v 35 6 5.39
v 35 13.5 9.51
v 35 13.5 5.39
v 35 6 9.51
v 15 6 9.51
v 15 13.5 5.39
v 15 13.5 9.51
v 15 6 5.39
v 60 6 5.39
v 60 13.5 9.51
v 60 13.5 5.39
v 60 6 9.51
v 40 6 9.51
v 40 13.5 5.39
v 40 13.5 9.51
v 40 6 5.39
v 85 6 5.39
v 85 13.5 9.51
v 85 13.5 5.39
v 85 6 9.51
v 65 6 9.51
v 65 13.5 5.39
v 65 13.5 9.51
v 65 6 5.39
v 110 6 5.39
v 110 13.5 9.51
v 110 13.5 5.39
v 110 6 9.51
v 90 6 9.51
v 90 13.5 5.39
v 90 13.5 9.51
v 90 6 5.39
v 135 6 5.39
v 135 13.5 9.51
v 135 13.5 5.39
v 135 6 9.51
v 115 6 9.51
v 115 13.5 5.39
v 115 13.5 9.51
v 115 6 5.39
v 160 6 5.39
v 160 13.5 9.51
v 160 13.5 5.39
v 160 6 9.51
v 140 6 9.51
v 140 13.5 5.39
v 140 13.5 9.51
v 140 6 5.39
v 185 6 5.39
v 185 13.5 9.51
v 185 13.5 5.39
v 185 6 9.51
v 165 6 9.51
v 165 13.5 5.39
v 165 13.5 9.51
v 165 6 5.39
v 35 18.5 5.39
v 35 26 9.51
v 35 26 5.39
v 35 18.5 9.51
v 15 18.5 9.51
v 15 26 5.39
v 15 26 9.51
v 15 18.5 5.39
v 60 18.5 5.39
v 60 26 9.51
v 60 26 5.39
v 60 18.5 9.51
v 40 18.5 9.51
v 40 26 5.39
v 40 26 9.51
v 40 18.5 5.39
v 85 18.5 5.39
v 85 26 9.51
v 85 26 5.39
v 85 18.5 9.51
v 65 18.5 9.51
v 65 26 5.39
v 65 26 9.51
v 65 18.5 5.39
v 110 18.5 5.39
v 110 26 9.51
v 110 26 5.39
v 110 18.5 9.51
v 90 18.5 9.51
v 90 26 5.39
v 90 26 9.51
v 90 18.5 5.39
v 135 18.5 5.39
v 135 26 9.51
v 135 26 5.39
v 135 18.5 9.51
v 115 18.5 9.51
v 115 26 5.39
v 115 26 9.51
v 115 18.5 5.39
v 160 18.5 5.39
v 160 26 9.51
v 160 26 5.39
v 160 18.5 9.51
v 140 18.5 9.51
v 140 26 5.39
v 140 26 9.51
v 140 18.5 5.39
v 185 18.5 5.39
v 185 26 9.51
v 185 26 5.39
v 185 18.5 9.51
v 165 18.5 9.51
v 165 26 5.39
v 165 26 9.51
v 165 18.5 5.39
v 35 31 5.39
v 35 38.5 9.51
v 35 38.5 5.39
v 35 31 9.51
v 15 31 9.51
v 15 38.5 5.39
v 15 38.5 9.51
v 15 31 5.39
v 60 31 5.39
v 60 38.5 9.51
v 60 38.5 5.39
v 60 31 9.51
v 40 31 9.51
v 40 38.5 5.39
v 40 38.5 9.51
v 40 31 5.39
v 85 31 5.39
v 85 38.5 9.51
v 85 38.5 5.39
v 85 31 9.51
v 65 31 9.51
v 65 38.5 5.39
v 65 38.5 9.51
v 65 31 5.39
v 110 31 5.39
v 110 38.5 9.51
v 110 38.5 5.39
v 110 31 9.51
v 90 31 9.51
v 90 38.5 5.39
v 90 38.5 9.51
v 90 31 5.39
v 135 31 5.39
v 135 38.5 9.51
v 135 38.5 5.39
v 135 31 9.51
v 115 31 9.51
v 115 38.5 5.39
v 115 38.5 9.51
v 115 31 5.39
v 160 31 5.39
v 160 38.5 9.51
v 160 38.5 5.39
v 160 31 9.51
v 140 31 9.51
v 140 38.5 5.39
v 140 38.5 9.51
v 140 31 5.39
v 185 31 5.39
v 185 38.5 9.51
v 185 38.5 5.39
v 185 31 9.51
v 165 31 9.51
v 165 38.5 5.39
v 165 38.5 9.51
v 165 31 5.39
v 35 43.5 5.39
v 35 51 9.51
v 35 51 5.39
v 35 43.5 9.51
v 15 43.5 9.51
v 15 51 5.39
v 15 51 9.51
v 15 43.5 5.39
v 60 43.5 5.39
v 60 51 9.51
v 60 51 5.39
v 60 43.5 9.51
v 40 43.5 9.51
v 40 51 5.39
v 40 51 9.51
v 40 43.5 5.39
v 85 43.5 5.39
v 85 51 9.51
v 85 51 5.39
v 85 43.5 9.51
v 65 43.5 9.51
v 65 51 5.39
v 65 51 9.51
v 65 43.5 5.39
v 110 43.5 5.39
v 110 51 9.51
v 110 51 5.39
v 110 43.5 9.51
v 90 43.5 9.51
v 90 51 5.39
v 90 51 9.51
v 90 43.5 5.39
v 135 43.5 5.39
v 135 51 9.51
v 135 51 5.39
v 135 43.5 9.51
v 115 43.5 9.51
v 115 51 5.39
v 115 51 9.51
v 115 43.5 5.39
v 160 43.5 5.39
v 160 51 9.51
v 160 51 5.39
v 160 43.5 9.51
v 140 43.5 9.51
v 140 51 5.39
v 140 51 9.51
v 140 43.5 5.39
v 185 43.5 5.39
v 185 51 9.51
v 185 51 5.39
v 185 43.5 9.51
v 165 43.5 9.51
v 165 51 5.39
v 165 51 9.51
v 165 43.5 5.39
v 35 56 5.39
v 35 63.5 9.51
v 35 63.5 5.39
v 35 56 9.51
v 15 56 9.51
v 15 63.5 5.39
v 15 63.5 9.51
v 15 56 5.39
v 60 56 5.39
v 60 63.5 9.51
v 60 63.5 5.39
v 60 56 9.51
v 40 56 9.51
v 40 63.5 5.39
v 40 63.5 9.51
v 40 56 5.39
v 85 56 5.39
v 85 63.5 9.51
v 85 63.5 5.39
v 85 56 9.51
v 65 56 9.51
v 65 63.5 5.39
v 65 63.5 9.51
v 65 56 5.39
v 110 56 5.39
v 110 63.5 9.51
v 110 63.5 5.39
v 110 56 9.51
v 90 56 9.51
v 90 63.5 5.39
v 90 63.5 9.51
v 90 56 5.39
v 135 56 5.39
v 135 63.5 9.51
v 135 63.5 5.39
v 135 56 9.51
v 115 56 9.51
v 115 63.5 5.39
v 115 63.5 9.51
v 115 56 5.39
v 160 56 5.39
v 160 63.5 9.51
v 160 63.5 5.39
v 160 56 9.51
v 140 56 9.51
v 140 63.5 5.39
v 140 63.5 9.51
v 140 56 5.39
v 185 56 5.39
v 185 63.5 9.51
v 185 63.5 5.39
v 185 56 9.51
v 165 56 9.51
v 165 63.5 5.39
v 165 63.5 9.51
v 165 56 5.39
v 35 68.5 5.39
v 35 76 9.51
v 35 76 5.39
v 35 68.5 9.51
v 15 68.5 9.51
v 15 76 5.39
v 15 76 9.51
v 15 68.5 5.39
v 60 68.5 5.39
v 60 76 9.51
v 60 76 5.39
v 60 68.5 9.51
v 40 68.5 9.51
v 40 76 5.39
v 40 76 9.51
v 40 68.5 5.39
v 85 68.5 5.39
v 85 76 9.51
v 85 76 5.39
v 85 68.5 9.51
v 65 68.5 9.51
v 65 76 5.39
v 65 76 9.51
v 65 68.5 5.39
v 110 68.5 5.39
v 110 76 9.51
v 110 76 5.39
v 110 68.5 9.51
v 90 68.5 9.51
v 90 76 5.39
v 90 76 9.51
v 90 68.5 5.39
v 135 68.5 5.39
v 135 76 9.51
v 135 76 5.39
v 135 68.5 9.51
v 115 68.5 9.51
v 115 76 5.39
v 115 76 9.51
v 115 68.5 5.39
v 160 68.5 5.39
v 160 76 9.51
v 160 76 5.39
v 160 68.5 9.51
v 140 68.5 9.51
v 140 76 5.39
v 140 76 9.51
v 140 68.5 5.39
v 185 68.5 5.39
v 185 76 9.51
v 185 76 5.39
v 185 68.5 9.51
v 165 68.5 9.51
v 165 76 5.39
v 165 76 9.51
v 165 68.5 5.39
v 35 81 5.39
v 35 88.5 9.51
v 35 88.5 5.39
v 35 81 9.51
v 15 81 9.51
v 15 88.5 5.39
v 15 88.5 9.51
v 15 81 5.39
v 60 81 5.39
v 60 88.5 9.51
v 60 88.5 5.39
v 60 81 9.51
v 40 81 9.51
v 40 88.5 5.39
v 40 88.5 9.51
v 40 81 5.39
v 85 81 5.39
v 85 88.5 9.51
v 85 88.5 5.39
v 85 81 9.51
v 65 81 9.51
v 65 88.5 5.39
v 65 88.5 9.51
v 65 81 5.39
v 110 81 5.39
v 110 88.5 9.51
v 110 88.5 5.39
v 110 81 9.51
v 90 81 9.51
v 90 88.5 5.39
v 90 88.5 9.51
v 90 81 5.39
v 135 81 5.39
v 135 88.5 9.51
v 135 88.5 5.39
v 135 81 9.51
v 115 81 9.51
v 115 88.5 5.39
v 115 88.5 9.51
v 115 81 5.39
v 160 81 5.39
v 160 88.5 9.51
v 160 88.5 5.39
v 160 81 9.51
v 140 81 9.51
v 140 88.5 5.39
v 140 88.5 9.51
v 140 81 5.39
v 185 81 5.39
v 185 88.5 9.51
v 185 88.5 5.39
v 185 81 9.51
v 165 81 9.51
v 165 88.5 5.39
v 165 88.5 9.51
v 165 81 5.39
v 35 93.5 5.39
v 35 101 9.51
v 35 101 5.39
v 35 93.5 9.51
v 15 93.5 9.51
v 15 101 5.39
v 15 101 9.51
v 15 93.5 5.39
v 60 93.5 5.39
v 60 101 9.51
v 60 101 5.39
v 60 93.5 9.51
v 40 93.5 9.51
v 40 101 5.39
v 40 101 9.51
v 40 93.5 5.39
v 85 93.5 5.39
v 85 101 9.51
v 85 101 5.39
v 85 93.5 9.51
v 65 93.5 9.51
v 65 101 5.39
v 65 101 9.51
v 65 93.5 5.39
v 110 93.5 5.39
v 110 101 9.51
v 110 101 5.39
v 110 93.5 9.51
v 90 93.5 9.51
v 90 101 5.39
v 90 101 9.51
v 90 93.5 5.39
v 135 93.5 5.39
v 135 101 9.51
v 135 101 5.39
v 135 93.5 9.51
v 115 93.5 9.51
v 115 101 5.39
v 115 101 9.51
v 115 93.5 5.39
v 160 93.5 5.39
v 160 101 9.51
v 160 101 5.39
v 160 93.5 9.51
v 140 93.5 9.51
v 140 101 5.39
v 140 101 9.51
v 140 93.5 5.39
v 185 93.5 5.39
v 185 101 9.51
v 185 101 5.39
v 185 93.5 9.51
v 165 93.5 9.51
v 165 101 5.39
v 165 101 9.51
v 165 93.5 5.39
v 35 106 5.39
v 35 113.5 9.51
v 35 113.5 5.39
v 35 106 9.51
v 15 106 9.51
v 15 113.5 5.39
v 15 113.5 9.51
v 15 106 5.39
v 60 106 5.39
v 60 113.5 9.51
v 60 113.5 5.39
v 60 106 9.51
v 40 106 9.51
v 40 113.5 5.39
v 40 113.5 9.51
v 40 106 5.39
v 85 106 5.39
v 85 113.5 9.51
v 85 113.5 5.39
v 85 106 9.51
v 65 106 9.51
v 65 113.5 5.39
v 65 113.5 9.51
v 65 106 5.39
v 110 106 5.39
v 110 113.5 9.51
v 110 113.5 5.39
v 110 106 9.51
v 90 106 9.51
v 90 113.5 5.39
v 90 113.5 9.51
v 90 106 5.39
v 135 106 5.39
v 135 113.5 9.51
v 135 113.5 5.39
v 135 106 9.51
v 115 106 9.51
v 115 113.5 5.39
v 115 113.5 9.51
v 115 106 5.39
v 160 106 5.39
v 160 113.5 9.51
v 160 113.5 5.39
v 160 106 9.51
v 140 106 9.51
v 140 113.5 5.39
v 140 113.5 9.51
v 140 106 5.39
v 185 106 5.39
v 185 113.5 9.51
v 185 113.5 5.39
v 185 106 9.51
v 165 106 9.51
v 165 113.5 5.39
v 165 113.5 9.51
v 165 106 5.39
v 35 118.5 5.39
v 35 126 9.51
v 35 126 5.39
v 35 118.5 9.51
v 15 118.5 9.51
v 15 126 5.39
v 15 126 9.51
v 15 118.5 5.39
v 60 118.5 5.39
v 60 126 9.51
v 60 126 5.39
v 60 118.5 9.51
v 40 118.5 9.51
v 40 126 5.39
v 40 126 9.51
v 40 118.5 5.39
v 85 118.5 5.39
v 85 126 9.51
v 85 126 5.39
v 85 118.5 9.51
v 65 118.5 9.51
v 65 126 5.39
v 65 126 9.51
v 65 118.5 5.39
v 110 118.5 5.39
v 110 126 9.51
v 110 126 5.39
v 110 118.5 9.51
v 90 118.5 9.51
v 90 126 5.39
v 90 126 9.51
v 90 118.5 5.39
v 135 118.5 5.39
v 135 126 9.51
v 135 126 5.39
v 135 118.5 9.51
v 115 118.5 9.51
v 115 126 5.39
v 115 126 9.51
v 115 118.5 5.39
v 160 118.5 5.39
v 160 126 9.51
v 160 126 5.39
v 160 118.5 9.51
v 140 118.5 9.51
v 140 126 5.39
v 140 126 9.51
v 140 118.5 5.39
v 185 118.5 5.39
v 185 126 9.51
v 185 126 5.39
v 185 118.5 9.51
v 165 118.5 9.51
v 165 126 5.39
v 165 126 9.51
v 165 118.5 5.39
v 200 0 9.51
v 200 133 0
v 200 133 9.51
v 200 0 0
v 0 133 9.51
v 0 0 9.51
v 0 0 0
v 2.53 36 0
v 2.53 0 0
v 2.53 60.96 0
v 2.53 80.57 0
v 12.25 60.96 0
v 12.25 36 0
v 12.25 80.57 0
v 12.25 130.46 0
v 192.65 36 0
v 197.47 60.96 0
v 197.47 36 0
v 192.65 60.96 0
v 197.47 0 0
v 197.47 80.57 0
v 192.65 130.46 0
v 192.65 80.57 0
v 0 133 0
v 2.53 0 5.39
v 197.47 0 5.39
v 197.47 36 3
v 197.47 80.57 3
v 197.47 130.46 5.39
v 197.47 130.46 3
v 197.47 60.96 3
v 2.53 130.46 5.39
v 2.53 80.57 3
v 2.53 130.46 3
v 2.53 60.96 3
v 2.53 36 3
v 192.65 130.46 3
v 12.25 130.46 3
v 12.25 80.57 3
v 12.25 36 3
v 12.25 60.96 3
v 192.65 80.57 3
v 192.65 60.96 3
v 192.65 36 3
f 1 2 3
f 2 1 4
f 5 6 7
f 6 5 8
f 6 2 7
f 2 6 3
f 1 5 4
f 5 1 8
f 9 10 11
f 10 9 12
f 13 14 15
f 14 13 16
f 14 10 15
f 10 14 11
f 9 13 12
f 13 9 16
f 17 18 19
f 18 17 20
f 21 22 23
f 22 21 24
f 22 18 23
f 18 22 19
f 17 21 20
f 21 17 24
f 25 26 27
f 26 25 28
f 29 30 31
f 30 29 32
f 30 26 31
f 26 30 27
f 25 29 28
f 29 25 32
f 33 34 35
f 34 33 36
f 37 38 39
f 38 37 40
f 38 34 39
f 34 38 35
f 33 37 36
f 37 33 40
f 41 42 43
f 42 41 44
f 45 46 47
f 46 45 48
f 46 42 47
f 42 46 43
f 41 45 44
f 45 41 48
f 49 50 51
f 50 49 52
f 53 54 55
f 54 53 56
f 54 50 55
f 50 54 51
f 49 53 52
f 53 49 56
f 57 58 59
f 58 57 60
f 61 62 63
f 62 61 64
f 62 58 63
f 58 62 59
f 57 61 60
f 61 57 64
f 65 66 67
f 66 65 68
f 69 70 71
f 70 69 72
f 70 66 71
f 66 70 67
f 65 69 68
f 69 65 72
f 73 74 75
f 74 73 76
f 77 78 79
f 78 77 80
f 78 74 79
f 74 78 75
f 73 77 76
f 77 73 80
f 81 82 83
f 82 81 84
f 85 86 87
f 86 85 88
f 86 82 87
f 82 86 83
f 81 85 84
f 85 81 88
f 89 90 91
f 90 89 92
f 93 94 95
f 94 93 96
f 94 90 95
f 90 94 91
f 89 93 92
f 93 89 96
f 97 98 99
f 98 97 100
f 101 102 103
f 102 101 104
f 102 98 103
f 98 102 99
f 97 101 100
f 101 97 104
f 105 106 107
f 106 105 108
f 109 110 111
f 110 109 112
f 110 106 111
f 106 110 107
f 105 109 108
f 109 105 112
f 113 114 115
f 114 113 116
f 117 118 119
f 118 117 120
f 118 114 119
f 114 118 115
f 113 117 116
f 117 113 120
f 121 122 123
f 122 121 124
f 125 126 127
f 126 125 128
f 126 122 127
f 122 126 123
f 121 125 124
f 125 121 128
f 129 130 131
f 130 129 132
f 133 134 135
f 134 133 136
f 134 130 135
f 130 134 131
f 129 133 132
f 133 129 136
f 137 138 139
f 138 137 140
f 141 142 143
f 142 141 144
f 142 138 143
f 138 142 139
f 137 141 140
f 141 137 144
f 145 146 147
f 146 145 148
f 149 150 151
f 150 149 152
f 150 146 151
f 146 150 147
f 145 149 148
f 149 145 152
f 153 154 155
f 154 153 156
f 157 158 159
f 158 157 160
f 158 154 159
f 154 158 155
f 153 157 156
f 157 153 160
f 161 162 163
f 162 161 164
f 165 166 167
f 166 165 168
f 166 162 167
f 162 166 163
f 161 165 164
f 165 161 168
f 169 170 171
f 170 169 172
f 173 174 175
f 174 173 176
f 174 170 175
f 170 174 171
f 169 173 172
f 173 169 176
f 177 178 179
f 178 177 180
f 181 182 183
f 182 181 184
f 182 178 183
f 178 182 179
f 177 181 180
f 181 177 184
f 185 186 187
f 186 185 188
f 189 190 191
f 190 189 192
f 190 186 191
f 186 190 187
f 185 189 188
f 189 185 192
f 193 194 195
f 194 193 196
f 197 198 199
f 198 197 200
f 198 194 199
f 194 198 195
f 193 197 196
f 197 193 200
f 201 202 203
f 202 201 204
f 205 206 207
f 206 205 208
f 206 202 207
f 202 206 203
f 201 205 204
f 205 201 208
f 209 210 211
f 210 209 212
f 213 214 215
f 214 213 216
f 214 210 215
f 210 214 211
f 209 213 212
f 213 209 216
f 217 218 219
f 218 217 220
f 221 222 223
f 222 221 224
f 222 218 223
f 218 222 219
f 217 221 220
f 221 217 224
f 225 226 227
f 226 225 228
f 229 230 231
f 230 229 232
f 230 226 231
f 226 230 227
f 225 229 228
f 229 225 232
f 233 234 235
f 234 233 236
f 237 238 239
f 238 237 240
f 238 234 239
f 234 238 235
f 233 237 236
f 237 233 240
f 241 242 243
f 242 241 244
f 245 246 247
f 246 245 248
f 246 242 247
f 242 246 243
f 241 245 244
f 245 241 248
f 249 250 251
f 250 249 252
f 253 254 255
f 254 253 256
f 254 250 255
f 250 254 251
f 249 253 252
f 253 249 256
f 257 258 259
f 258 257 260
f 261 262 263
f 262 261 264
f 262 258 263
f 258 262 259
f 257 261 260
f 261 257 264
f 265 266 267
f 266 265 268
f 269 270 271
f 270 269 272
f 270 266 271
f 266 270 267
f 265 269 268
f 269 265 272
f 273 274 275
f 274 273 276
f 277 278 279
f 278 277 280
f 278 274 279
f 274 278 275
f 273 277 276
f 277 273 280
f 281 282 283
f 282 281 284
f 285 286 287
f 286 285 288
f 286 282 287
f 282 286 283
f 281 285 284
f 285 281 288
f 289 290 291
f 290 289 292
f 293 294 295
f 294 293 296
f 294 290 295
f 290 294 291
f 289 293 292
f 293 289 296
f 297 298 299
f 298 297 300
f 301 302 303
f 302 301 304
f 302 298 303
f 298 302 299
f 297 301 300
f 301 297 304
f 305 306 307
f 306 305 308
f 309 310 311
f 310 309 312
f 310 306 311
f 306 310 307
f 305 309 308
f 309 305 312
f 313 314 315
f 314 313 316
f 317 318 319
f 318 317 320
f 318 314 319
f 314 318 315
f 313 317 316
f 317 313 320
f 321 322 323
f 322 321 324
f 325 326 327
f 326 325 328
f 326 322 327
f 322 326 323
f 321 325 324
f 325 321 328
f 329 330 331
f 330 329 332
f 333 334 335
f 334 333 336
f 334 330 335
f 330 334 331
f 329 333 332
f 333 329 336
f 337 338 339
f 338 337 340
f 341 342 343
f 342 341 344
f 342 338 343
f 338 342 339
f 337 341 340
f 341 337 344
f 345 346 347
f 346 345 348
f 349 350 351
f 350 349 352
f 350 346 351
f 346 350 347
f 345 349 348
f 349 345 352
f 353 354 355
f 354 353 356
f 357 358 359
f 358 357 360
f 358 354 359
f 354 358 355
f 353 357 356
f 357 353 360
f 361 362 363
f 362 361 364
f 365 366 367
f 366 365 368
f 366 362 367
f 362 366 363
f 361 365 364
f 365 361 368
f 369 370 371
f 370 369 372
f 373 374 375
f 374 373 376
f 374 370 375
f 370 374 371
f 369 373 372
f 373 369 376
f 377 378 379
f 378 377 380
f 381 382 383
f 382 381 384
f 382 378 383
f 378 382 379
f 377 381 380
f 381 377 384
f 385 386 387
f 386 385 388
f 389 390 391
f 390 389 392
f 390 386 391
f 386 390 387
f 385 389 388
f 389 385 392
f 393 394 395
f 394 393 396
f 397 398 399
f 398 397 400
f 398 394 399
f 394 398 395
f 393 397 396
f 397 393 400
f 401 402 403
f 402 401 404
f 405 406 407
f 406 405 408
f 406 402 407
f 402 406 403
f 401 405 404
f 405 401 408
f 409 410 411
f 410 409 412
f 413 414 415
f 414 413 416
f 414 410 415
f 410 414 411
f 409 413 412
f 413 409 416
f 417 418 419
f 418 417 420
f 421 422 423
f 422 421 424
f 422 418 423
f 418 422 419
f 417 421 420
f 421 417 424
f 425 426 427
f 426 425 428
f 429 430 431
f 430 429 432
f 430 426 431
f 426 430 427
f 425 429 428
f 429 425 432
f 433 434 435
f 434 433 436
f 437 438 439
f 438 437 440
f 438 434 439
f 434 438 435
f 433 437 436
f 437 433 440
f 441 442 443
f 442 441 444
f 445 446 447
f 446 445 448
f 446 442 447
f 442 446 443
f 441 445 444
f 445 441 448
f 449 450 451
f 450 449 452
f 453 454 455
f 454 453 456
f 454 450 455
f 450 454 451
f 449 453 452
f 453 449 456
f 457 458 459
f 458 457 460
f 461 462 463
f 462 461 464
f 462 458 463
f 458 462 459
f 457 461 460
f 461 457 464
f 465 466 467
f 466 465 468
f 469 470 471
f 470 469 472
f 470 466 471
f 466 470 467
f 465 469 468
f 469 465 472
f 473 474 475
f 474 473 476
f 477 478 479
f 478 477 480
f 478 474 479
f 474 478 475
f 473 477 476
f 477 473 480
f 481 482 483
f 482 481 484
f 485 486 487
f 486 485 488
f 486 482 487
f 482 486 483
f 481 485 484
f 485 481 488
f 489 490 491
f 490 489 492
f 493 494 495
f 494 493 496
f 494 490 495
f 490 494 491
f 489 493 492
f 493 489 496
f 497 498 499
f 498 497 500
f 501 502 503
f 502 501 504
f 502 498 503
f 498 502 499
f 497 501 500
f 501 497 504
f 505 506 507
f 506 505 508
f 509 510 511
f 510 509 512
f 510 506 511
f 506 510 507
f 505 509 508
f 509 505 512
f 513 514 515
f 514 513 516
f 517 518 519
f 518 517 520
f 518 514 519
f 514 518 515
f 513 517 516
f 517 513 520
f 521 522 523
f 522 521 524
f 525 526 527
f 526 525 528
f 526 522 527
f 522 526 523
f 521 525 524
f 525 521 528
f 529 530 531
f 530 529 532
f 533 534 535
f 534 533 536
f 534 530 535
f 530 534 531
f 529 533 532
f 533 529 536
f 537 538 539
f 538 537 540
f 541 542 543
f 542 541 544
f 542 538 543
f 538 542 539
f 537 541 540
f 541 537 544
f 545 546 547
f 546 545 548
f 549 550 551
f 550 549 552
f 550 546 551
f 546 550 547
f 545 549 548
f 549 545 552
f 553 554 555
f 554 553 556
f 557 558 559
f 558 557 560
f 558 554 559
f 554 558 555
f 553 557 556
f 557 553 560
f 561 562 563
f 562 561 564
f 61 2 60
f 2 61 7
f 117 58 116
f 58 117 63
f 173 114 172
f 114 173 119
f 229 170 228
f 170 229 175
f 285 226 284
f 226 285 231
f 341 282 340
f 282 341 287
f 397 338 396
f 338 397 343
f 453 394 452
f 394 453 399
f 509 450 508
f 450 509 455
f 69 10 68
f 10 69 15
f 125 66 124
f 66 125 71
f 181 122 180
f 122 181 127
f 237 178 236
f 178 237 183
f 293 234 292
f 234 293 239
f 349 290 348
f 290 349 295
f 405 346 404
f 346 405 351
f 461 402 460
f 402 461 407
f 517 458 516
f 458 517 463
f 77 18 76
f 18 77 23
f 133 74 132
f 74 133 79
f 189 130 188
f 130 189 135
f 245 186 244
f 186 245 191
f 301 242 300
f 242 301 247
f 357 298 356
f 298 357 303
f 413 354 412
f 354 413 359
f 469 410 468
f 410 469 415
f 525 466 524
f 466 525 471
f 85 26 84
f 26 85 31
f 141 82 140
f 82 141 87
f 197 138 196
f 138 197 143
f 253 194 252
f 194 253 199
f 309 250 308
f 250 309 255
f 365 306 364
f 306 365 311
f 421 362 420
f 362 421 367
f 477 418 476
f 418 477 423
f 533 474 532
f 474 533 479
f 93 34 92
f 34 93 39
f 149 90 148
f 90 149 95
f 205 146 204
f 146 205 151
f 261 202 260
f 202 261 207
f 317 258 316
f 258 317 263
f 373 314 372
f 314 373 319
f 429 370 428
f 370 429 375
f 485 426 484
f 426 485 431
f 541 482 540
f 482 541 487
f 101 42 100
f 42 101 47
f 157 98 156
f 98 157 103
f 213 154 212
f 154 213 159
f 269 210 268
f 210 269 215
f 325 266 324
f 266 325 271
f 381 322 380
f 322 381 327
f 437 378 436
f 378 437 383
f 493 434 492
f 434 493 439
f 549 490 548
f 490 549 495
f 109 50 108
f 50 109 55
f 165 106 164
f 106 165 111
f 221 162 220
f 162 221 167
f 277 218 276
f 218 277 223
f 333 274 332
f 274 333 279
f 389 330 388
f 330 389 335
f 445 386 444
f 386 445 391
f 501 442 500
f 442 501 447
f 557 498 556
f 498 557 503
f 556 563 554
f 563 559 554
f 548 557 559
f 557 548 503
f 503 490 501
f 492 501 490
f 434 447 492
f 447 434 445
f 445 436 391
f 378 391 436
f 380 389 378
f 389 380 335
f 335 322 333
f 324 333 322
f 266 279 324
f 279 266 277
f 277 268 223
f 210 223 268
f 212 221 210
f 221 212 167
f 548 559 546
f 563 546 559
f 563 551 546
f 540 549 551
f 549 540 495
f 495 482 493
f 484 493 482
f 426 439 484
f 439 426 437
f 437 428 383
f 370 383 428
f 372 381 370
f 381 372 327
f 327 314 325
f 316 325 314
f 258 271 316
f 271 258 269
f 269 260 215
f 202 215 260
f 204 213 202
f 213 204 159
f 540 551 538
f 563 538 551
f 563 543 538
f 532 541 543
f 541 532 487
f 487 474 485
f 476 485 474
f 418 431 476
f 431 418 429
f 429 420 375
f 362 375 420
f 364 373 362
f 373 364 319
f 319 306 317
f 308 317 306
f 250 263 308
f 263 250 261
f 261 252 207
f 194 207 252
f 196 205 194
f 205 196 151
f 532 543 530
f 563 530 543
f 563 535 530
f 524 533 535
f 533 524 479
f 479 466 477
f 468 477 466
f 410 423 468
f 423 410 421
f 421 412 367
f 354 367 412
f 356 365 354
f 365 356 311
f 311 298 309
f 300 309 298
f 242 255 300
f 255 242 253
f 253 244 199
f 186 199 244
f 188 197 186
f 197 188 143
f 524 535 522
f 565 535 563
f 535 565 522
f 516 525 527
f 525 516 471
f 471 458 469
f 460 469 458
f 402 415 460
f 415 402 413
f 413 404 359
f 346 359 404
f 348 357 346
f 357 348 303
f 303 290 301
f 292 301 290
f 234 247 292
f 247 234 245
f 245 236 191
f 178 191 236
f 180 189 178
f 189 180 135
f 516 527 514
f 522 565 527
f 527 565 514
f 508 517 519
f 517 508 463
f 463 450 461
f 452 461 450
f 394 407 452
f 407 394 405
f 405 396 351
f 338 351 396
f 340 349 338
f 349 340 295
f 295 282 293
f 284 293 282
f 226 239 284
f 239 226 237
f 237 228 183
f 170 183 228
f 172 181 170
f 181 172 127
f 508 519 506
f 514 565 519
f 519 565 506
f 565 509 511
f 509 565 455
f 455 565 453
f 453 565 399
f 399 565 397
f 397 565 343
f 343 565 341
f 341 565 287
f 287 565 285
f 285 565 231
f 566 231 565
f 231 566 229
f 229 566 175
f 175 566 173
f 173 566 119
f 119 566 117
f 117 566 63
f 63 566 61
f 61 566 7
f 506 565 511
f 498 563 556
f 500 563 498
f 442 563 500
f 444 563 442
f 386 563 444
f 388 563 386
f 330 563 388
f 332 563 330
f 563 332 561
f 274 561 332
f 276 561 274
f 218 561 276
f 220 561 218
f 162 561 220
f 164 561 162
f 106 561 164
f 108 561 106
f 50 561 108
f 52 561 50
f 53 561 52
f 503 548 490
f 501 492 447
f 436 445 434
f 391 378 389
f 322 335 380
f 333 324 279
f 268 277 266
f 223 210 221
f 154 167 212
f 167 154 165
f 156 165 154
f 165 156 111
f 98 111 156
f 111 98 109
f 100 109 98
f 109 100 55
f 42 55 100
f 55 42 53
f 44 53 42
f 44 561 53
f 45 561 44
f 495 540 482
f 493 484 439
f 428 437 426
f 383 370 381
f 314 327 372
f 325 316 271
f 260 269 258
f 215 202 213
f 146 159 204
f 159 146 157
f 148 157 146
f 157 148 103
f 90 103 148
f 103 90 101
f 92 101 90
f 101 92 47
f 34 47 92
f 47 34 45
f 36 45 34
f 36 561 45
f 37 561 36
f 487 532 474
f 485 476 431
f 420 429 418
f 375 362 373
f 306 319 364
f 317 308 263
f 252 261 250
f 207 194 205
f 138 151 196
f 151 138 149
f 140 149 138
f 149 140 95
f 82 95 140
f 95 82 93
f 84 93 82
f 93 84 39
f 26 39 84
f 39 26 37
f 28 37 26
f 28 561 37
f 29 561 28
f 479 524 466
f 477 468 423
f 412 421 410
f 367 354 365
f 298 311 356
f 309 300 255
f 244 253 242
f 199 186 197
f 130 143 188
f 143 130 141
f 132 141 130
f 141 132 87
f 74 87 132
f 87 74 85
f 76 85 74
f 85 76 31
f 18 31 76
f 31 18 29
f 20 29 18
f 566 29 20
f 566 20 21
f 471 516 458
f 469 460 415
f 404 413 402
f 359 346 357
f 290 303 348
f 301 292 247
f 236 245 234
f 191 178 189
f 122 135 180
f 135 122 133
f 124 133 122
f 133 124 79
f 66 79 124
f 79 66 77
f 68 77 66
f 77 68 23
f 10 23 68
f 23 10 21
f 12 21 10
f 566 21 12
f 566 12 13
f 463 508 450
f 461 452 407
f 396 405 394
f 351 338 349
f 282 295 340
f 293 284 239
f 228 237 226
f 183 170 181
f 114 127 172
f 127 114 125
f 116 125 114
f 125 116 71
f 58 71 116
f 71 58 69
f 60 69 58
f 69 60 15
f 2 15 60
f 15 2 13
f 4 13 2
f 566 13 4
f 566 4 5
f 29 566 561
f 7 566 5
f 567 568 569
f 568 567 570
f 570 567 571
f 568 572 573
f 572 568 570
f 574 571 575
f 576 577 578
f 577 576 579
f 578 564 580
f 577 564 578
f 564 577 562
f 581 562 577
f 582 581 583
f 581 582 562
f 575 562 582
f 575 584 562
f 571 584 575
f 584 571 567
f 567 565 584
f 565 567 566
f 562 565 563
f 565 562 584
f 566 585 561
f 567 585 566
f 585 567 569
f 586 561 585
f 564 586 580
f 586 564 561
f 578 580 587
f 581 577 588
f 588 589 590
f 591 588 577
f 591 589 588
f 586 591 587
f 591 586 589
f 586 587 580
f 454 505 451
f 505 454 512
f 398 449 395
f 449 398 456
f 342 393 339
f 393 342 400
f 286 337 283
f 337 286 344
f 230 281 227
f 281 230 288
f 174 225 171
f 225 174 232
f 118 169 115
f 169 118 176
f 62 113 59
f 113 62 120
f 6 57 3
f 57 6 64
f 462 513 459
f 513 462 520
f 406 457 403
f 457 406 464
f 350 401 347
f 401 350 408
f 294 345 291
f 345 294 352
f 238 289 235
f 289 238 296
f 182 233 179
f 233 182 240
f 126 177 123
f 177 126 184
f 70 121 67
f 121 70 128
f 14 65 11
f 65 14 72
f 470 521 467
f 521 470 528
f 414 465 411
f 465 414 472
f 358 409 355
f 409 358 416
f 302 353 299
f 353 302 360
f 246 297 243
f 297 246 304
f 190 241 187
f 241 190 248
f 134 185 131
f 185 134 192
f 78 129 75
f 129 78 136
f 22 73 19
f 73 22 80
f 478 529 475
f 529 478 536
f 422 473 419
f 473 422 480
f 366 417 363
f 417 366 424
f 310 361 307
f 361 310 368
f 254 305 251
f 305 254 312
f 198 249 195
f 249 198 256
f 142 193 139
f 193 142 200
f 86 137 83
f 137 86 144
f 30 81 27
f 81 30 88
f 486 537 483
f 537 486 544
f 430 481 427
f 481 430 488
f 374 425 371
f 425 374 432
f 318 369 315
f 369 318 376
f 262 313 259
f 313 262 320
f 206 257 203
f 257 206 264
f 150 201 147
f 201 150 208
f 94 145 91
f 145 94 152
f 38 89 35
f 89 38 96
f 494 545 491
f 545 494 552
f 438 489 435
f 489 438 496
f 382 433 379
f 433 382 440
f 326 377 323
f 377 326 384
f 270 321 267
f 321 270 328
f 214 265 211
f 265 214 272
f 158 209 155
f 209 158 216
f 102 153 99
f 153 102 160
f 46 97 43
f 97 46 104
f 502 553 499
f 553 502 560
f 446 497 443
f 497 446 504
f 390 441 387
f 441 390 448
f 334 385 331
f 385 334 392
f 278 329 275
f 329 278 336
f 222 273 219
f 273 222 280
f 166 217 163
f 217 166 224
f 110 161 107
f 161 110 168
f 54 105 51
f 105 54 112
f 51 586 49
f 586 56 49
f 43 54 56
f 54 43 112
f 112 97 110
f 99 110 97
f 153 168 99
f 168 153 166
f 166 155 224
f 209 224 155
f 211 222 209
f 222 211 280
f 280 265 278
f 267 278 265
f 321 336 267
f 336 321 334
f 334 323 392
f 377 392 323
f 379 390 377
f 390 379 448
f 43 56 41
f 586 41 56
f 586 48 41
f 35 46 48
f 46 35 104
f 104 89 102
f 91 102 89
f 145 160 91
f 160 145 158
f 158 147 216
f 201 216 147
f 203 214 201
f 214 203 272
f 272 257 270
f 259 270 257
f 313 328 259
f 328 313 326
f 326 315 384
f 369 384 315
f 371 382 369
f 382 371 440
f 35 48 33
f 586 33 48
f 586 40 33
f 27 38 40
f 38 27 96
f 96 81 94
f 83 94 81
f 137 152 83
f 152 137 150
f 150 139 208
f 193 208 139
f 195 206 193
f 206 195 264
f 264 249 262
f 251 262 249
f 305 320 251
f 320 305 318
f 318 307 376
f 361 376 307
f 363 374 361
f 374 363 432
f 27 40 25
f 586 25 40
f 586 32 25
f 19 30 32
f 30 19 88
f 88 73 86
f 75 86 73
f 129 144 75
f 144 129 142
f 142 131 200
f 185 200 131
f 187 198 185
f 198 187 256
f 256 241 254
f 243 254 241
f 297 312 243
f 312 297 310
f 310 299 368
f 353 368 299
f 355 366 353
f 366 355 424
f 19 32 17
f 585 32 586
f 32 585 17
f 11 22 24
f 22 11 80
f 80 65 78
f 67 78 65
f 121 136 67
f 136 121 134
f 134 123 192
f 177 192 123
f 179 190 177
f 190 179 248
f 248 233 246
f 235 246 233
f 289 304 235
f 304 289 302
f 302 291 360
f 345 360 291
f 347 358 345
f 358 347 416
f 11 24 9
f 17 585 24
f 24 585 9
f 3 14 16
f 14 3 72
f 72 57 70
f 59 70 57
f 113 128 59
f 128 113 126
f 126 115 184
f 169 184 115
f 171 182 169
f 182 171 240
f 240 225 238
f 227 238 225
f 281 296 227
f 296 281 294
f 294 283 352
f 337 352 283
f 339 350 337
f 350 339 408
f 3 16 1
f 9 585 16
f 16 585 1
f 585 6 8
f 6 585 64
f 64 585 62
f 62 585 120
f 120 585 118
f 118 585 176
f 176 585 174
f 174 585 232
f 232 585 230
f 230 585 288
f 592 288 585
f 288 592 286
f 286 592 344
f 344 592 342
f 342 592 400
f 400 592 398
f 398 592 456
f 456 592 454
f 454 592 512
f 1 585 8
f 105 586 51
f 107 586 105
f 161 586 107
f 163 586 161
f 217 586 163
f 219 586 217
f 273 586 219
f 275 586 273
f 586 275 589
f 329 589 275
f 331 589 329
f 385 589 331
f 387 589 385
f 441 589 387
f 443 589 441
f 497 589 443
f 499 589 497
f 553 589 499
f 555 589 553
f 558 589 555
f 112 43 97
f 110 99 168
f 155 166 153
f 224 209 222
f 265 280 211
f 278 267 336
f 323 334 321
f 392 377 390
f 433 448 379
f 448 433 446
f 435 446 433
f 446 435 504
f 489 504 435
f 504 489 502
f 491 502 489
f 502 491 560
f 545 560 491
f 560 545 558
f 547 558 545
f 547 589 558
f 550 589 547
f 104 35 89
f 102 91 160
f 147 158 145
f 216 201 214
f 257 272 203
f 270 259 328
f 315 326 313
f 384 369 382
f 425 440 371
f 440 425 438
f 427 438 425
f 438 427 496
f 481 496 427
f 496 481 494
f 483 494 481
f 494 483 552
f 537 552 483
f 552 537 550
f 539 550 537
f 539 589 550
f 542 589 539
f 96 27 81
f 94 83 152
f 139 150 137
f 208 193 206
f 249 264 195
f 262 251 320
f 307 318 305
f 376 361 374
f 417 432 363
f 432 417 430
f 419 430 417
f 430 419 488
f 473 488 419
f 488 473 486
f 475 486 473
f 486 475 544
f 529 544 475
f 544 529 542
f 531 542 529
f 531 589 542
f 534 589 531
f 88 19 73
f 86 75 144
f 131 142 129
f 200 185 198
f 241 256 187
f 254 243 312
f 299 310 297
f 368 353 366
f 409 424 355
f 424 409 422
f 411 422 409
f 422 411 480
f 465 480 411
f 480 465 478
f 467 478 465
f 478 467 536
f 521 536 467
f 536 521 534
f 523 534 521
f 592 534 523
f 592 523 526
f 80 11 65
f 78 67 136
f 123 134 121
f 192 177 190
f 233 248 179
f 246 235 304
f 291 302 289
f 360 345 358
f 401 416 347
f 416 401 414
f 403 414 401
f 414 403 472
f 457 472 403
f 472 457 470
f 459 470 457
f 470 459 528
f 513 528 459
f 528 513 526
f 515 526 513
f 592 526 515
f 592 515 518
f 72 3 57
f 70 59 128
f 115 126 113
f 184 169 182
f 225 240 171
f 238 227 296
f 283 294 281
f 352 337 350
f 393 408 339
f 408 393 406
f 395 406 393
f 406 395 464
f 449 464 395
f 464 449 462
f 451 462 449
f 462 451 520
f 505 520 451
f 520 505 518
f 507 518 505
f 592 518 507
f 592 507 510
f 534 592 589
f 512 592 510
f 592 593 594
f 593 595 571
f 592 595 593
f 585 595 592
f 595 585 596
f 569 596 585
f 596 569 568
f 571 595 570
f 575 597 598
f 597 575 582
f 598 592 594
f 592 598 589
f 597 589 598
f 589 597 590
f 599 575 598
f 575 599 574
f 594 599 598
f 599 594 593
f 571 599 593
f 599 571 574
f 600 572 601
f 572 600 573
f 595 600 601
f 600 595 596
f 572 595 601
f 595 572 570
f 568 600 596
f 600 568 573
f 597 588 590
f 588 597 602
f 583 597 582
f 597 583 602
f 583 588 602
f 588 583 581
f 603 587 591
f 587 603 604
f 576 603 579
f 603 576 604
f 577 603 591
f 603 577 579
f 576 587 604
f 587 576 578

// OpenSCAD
// file: ../Parameters.scad
backplateWidth = 280;
backplateHeight = 750;
backplateThickness = 1.35;
cupsThickness = 3;
// file: utils/MakeVentGrill.scad
module makeVentGrill(width, height) {
    cutoutSize = [20, 7.50];
    spacing = 5;
    for(y = [0:height - 1]) {
        for(x = [0:width - 1]) {
            translate([
                x * (cutoutSize[0] + spacing),
                y * (cutoutSize[1] + spacing),
                0
            ])
            cube([cutoutSize[0], cutoutSize[1], 1]);
        }
    }
}

makeVentGrill(5, 5);
// main file
use <utils/MakeVentGrill.scad>;
include <../Parameters.scad>;

thickness = 8.16 + backplateThickness;
ventWidth = 200;
ventHeight = 133;
borderThickness = 2.53;

function heatExhaustVentBoundingBox() =
    [ventWidth, ventHeight, thickness];

module heatExhaustVent() {

    difference () {
        difference() {
            cube(heatExhaustVentBoundingBox());
            translate([15, 6, -0.05]) scale([1, 1, thickness + 0.1]) makeVentGrill(7, 10);
        }
        pushIn();
    }
    cups();
    
    module pushIn() {
        thickness = 5.40;
        translate([borderThickness, -0.01, -0.01])
            cube([ventWidth - (borderThickness * 2), ventHeight - borderThickness, thickness]);
    }

    module cups() {
        module left() {
            firstHeight = 49.90;
            secondHeight = 24.96;
            width = 12.25;
            translate([0, ventHeight - firstHeight - borderThickness]) 
            cube([width, firstHeight, cupsThickness]);

            translate([0, 36, 0]) 
            cube([width, secondHeight, cupsThickness]);
        }

        module right() {
            firstHeight = 49.90;
            secondHeight = 24.96;
            width = 7.35;
            translate([ventWidth - width, ventHeight - firstHeight - borderThickness]) 
            cube([width, firstHeight, cupsThickness]);

            translate([ventWidth - width, 36, 0]) 
            cube([width, secondHeight, cupsThickness]);
        }

        left();
        right();
    }
}

heatExhaustVent();
